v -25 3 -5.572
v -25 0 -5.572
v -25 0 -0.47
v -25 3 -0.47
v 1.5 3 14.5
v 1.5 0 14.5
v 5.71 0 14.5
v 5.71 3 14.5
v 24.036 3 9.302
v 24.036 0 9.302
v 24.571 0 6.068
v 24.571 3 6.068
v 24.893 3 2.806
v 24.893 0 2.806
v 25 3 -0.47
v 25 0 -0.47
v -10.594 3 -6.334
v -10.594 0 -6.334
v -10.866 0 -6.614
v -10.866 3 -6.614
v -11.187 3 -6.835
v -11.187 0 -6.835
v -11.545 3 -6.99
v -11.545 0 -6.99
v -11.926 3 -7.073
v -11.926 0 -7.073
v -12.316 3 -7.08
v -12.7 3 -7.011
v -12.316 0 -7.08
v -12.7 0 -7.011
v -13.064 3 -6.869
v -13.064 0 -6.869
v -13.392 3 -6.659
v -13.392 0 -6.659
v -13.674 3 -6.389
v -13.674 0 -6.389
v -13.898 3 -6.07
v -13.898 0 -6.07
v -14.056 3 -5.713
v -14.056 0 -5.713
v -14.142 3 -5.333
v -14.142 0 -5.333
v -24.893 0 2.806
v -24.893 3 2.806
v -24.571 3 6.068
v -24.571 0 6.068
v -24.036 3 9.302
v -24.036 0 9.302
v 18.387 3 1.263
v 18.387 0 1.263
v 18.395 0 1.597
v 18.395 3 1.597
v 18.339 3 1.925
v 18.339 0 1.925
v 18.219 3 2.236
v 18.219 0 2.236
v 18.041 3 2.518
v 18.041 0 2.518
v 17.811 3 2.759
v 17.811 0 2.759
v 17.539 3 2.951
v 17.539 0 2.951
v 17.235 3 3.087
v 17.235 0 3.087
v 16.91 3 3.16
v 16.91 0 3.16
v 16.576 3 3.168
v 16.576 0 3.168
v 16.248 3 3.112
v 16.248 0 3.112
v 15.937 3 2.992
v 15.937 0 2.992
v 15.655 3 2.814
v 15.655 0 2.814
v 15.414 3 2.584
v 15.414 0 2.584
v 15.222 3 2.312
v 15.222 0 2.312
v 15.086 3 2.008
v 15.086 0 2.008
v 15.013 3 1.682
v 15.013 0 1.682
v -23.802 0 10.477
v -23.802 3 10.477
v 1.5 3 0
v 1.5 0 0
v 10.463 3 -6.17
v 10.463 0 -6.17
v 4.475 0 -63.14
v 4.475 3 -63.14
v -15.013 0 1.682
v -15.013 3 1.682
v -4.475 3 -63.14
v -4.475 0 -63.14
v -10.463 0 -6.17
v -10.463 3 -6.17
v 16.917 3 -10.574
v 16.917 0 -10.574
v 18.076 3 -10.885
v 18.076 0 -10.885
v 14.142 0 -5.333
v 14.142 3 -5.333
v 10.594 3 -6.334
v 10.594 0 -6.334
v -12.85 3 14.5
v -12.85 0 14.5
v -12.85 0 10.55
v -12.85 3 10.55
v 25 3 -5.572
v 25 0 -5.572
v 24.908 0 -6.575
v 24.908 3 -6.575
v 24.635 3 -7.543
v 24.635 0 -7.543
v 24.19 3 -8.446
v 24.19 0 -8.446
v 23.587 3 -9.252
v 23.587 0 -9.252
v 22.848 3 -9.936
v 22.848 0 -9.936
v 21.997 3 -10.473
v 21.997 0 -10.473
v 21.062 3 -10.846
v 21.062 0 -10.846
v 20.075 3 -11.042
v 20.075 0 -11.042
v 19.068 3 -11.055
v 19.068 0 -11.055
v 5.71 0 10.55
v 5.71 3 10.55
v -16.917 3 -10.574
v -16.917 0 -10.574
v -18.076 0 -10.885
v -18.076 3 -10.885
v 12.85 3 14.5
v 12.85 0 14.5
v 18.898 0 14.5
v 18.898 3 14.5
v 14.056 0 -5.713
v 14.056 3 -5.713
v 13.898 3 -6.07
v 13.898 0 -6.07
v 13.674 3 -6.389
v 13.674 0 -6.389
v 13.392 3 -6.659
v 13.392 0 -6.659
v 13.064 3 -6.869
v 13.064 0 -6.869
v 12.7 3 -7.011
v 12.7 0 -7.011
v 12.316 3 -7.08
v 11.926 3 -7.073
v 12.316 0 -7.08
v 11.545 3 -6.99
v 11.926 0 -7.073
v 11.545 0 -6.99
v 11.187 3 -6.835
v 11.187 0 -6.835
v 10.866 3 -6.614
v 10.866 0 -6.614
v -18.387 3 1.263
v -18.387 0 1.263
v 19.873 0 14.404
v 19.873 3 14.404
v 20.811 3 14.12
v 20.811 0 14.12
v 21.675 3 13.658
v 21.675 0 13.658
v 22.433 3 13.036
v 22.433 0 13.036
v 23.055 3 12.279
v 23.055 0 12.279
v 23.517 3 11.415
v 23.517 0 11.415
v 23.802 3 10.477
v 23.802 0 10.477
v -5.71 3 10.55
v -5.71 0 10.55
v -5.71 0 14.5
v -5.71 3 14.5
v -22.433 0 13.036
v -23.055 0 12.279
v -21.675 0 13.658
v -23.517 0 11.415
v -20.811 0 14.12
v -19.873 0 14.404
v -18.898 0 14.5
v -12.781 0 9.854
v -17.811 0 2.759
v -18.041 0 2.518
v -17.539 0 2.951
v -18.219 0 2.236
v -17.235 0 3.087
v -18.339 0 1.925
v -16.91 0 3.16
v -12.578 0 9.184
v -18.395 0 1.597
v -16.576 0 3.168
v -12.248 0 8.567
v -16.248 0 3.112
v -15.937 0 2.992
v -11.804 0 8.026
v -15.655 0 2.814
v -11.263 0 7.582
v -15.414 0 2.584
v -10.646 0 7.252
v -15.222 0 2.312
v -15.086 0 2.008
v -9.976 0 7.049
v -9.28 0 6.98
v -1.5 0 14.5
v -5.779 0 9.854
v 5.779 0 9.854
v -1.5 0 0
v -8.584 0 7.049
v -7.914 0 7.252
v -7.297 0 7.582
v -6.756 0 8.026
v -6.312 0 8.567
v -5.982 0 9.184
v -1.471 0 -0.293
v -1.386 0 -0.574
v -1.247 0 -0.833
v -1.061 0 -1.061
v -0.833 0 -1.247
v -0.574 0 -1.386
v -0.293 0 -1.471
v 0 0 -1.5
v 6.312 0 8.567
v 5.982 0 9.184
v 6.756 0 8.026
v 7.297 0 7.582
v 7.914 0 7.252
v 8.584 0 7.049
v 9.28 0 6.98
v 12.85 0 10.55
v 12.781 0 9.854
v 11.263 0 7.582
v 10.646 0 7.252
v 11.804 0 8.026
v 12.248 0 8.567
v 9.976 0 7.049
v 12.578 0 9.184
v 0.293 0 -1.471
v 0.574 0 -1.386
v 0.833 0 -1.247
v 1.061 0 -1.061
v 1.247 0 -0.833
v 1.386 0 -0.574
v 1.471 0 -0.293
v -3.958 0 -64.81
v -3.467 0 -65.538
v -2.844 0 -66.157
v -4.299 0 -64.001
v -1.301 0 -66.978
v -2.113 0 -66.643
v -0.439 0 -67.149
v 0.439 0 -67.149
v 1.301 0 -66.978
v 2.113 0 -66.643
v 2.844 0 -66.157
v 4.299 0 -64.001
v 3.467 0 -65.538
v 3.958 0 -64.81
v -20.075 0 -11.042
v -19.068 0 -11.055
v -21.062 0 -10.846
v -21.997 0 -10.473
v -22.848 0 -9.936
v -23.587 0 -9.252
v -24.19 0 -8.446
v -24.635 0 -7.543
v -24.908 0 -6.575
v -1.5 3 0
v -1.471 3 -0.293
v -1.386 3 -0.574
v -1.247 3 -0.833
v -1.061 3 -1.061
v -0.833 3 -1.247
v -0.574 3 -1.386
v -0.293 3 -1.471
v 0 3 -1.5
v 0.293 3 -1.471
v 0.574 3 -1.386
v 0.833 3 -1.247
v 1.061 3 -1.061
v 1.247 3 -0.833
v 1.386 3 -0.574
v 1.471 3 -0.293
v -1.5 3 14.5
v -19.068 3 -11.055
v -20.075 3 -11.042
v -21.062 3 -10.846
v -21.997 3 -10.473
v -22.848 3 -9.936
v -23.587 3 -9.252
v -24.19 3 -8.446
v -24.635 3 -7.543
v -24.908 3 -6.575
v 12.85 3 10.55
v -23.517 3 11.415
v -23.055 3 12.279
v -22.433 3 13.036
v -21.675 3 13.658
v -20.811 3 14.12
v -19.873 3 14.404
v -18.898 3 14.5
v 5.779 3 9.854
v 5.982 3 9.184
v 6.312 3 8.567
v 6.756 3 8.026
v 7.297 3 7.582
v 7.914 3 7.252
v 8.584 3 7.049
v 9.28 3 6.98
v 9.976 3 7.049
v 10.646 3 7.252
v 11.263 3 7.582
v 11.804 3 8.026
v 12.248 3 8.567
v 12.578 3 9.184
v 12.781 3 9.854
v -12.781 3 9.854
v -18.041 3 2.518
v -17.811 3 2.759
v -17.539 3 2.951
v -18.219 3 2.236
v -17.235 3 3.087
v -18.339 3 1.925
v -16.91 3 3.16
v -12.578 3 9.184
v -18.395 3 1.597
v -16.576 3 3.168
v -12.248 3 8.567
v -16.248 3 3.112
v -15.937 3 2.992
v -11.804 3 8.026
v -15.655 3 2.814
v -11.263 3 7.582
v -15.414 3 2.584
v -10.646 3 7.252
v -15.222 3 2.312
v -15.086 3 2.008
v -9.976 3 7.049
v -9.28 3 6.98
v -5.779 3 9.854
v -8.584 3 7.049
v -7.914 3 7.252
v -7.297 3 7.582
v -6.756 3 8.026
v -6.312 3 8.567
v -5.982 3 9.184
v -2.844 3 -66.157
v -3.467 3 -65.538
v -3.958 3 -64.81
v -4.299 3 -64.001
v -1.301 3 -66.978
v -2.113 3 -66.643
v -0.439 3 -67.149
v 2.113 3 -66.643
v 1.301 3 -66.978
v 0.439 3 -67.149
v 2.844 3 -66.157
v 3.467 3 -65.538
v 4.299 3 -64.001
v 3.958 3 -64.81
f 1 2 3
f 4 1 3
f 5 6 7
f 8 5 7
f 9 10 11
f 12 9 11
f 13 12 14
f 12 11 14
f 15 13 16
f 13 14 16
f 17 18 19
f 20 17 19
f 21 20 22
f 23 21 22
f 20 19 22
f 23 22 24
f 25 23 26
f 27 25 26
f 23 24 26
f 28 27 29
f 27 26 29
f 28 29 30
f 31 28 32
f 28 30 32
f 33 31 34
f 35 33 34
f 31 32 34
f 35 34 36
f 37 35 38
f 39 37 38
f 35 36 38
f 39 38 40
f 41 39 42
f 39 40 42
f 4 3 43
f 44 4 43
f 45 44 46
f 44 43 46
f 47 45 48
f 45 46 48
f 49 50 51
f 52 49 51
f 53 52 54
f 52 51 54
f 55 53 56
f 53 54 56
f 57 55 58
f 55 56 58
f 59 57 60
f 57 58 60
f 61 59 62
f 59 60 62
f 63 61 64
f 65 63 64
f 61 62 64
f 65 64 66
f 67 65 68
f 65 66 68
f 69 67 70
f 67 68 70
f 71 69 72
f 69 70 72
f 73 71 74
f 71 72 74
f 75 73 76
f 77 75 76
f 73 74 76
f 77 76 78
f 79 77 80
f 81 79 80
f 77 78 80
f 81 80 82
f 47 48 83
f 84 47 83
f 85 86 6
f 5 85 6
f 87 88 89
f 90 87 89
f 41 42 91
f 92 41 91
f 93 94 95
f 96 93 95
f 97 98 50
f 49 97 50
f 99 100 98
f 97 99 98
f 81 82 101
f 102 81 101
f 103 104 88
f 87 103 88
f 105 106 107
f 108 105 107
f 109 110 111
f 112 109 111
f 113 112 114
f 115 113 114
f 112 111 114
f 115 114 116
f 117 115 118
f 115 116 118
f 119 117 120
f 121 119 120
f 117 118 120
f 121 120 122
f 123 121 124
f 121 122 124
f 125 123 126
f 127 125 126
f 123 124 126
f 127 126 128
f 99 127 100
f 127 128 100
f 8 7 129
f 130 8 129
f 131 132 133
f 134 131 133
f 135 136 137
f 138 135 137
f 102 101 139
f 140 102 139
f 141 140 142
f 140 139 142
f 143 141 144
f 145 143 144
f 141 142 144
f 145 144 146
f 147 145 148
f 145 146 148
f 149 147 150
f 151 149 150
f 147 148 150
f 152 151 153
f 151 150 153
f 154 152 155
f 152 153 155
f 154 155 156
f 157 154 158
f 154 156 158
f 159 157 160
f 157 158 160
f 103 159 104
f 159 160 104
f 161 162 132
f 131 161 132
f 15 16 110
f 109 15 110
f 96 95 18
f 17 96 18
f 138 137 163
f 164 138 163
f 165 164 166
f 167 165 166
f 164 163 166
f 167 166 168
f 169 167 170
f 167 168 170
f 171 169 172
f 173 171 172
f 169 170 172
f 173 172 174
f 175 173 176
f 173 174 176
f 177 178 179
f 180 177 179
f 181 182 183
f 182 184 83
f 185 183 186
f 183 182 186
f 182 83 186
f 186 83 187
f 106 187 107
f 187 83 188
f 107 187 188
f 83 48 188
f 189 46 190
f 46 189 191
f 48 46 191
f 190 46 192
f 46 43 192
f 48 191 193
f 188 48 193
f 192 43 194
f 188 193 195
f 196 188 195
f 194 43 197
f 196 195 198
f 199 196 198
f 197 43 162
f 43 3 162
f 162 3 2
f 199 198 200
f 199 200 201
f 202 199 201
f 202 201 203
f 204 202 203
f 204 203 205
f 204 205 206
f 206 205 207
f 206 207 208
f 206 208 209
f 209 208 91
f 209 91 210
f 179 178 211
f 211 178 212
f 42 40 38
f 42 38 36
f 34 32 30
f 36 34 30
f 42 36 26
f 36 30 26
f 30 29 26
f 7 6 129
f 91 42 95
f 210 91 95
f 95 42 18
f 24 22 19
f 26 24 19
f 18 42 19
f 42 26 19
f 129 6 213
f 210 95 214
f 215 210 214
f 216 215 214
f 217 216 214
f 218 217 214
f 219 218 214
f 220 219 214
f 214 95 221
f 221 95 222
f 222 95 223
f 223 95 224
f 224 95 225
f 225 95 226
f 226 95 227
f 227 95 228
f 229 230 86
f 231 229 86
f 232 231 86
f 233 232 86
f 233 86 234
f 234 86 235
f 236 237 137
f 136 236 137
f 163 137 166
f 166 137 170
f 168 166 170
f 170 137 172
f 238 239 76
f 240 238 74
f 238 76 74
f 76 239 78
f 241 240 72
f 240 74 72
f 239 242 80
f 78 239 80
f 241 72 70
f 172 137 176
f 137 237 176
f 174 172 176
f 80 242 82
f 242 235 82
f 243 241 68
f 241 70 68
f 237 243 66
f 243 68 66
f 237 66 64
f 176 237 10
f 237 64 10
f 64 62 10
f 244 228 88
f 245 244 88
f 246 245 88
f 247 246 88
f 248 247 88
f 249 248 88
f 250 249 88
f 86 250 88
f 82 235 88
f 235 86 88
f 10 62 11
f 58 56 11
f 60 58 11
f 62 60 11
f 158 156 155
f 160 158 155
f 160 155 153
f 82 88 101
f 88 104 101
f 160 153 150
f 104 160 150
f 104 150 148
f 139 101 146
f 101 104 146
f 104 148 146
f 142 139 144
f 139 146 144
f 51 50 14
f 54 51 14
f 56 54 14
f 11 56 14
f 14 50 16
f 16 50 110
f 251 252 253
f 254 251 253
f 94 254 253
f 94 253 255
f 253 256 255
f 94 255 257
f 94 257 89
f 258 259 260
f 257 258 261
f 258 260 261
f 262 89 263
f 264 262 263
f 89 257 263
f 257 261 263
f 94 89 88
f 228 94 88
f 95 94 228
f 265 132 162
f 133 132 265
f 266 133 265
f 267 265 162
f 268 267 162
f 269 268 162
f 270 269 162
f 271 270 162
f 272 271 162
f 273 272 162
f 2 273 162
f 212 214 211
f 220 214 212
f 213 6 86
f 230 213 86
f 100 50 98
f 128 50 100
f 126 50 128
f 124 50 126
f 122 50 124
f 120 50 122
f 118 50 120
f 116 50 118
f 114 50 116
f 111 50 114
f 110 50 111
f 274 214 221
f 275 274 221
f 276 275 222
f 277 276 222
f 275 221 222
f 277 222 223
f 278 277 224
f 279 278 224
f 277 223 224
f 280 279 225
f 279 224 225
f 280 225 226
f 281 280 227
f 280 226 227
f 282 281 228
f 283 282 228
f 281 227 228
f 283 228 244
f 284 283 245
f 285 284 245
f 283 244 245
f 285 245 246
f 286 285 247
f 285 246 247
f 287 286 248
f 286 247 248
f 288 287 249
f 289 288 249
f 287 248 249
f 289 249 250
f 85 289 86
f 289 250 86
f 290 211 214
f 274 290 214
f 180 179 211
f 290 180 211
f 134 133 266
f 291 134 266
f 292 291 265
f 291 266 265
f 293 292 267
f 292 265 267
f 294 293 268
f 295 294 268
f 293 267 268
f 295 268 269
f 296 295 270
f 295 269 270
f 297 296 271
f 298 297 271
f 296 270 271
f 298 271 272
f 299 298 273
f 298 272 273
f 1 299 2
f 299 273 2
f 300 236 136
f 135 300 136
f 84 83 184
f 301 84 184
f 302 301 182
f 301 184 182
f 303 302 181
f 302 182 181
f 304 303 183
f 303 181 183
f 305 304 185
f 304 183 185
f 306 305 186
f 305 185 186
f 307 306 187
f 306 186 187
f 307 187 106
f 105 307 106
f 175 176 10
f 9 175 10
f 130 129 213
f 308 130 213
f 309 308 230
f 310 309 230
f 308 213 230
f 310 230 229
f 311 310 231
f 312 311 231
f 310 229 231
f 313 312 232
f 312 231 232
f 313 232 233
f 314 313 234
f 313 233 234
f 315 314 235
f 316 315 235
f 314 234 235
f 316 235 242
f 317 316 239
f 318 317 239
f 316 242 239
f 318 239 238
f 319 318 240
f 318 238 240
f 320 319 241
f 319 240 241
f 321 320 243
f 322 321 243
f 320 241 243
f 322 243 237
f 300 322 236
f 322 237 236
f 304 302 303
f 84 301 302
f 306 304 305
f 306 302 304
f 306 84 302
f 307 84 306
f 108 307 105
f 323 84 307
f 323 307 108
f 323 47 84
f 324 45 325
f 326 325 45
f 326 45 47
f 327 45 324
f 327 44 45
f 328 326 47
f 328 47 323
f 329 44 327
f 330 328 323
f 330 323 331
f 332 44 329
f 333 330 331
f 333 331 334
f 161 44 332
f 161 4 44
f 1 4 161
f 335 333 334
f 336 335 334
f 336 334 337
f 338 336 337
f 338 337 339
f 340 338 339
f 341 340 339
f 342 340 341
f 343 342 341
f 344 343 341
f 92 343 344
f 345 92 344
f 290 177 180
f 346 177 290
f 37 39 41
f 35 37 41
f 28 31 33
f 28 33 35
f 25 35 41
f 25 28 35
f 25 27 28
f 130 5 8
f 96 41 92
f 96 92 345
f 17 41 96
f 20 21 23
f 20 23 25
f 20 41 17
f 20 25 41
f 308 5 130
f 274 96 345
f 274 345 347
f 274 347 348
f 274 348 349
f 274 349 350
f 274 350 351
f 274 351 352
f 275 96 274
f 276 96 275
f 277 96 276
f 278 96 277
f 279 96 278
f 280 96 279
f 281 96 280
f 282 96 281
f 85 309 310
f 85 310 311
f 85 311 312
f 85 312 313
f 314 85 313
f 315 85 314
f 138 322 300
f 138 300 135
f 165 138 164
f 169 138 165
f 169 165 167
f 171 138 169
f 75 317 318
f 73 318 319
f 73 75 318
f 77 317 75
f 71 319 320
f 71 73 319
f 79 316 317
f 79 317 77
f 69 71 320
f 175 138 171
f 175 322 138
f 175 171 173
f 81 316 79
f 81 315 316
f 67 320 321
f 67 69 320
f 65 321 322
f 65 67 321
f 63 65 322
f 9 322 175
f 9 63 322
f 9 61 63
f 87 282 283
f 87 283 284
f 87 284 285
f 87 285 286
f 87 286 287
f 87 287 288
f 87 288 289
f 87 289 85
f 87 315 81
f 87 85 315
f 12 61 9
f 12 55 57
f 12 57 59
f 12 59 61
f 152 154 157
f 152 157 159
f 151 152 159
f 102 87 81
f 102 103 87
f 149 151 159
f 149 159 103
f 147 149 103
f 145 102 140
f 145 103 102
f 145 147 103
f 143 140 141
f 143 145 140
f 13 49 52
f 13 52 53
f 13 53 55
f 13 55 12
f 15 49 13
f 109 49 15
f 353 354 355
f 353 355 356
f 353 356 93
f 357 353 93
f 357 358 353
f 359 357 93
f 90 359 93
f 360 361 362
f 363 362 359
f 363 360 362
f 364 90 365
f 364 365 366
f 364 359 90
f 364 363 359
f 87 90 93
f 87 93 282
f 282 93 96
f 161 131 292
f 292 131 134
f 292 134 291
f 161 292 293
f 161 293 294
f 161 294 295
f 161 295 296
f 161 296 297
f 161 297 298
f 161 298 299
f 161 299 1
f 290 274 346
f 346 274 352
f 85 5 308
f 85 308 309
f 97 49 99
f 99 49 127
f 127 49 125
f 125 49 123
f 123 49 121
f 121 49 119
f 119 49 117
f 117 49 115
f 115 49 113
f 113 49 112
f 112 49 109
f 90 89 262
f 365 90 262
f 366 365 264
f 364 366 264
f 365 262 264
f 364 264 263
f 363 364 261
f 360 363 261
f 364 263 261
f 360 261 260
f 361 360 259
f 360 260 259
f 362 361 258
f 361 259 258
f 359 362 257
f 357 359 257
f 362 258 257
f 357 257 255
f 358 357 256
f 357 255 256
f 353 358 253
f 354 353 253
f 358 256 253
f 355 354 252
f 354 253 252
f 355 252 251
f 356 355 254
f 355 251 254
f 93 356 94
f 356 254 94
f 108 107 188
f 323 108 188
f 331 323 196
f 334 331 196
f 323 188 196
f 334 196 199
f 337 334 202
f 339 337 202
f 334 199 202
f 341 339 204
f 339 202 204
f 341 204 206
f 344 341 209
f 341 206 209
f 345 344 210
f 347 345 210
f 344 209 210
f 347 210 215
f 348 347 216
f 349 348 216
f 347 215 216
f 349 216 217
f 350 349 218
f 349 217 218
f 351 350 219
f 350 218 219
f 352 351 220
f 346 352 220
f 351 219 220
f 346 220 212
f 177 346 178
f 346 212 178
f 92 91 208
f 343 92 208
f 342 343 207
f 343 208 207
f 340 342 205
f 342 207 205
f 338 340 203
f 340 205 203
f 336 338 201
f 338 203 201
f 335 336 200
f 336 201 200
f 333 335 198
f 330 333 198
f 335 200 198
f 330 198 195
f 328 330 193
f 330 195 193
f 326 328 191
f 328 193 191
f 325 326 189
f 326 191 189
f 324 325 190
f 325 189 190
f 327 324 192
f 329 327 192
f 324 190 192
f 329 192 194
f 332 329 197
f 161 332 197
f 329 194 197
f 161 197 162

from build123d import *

# Parameters (mm, degrees)
BOSS_EXTRUDE1_DEPTH = 3


with BuildPart() as part:
    # Sketch1 → Boss-Extrude1 (new body)
    with BuildSketch(Plane(origin=(0, 0, 0), x_dir=(1, 0, 0), z_dir=(0, 1, 0))):
        with BuildLine():
            Line((10.463176551, 6.170000059), (4.475348529, 63.140378143))
            ThreePointArc((4.475348529, 63.140378143), (0, 67.170000059), (-4.475348529, 63.140378143))
            Line((-4.475348529, 63.140378143), (-10.463176551, 6.170000059))
            Line((-10.463176551, 6.170000059), (-10.594086082, 6.333950269))
            ThreePointArc((-10.594086082, 6.333950269), (-12.700318865, 7.010801248), (-14.141740272, 5.332513992))
            Line((-14.141740272, 5.332513992), (-15.012961009, -1.682423602))
            ThreePointArc((-15.012961009, -1.682423602), (-16.909521943, -3.15994065), (-18.387038991, -1.263379717))
            Line((-18.387038991, -1.263379717), (-16.916878018, 10.574134051))
            Line((-16.916878018, 10.574134051), (-18.076495252, 10.884852553))
            ThreePointArc((-18.076495252, 10.884852553), (-22.84818786, 9.93570388), (-25, 5.572260508))
            Line((-25, 5.572260508), (-25, 0.469626677))
            ThreePointArc((-25, 0.469626677), (-24.758369054, -4.440028009), (-24.035811635, -9.302229714))
            Line((-24.035811635, -9.302229714), (-23.801666433, -10.47718558))
            ThreePointArc((-23.801666433, -10.47718558), (-22.069368276, -13.365612971), (-18.89808527, -14.499999941))
            Line((-18.89808527, -14.499999941), (-12.85, -14.499999941))
            Line((-12.85, -14.499999941), (-12.85, -10.549999941))
            ThreePointArc((-12.85, -10.549999941), (-9.28, -6.979999941), (-5.71, -10.549999941))
            Line((-5.71, -10.549999941), (-5.71, -14.499999941))
            Line((-5.71, -14.499999941), (-1.500000059, -14.499999941))
            Line((-1.500000059, -14.499999941), (-1.500000059, 0))
            ThreePointArc((-1.500000059, 0), (0, 1.500000059), (1.500000059, 0))
            Line((1.500000059, 0), (1.500000059, -14.499999941))
            Line((1.500000059, -14.499999941), (5.71, -14.499999941))
            Line((5.71, -14.499999941), (5.71, -10.549999941))
            ThreePointArc((5.71, -10.549999941), (9.28, -6.979999941), (12.85, -10.549999941))
            Line((12.85, -10.549999941), (12.85, -14.499999941))
            Line((12.85, -14.499999941), (18.89808527, -14.499999941))
            ThreePointArc((18.89808527, -14.499999941), (22.069368276, -13.365612971), (23.801666433, -10.47718558))
            Line((23.801666433, -10.47718558), (24.035811635, -9.302229714))
            ThreePointArc((24.035811635, -9.302229714), (24.758369054, -4.440028009), (25, 0.469626677))
            Line((25, 0.469626677), (25, 5.572260508))
            ThreePointArc((25, 5.572260508), (22.84818786, 9.93570388), (18.076495252, 10.884852553))
            Line((18.076495252, 10.884852553), (16.916878018, 10.574134051))
            Line((16.916878018, 10.574134051), (18.387038991, -1.263379717))
            ThreePointArc((18.387038991, -1.263379717), (16.909521943, -3.15994065), (15.012961009, -1.682423602))
            Line((15.012961009, -1.682423602), (14.141740272, 5.332513992))
            ThreePointArc((14.141740272, 5.332513992), (12.700318865, 7.010801248), (10.594086082, 6.333950269))
            Line((10.594086082, 6.333950269), (10.463176551, 6.170000059))
        make_face()
    extrude(amount=BOSS_EXTRUDE1_DEPTH)


solid = part.part
